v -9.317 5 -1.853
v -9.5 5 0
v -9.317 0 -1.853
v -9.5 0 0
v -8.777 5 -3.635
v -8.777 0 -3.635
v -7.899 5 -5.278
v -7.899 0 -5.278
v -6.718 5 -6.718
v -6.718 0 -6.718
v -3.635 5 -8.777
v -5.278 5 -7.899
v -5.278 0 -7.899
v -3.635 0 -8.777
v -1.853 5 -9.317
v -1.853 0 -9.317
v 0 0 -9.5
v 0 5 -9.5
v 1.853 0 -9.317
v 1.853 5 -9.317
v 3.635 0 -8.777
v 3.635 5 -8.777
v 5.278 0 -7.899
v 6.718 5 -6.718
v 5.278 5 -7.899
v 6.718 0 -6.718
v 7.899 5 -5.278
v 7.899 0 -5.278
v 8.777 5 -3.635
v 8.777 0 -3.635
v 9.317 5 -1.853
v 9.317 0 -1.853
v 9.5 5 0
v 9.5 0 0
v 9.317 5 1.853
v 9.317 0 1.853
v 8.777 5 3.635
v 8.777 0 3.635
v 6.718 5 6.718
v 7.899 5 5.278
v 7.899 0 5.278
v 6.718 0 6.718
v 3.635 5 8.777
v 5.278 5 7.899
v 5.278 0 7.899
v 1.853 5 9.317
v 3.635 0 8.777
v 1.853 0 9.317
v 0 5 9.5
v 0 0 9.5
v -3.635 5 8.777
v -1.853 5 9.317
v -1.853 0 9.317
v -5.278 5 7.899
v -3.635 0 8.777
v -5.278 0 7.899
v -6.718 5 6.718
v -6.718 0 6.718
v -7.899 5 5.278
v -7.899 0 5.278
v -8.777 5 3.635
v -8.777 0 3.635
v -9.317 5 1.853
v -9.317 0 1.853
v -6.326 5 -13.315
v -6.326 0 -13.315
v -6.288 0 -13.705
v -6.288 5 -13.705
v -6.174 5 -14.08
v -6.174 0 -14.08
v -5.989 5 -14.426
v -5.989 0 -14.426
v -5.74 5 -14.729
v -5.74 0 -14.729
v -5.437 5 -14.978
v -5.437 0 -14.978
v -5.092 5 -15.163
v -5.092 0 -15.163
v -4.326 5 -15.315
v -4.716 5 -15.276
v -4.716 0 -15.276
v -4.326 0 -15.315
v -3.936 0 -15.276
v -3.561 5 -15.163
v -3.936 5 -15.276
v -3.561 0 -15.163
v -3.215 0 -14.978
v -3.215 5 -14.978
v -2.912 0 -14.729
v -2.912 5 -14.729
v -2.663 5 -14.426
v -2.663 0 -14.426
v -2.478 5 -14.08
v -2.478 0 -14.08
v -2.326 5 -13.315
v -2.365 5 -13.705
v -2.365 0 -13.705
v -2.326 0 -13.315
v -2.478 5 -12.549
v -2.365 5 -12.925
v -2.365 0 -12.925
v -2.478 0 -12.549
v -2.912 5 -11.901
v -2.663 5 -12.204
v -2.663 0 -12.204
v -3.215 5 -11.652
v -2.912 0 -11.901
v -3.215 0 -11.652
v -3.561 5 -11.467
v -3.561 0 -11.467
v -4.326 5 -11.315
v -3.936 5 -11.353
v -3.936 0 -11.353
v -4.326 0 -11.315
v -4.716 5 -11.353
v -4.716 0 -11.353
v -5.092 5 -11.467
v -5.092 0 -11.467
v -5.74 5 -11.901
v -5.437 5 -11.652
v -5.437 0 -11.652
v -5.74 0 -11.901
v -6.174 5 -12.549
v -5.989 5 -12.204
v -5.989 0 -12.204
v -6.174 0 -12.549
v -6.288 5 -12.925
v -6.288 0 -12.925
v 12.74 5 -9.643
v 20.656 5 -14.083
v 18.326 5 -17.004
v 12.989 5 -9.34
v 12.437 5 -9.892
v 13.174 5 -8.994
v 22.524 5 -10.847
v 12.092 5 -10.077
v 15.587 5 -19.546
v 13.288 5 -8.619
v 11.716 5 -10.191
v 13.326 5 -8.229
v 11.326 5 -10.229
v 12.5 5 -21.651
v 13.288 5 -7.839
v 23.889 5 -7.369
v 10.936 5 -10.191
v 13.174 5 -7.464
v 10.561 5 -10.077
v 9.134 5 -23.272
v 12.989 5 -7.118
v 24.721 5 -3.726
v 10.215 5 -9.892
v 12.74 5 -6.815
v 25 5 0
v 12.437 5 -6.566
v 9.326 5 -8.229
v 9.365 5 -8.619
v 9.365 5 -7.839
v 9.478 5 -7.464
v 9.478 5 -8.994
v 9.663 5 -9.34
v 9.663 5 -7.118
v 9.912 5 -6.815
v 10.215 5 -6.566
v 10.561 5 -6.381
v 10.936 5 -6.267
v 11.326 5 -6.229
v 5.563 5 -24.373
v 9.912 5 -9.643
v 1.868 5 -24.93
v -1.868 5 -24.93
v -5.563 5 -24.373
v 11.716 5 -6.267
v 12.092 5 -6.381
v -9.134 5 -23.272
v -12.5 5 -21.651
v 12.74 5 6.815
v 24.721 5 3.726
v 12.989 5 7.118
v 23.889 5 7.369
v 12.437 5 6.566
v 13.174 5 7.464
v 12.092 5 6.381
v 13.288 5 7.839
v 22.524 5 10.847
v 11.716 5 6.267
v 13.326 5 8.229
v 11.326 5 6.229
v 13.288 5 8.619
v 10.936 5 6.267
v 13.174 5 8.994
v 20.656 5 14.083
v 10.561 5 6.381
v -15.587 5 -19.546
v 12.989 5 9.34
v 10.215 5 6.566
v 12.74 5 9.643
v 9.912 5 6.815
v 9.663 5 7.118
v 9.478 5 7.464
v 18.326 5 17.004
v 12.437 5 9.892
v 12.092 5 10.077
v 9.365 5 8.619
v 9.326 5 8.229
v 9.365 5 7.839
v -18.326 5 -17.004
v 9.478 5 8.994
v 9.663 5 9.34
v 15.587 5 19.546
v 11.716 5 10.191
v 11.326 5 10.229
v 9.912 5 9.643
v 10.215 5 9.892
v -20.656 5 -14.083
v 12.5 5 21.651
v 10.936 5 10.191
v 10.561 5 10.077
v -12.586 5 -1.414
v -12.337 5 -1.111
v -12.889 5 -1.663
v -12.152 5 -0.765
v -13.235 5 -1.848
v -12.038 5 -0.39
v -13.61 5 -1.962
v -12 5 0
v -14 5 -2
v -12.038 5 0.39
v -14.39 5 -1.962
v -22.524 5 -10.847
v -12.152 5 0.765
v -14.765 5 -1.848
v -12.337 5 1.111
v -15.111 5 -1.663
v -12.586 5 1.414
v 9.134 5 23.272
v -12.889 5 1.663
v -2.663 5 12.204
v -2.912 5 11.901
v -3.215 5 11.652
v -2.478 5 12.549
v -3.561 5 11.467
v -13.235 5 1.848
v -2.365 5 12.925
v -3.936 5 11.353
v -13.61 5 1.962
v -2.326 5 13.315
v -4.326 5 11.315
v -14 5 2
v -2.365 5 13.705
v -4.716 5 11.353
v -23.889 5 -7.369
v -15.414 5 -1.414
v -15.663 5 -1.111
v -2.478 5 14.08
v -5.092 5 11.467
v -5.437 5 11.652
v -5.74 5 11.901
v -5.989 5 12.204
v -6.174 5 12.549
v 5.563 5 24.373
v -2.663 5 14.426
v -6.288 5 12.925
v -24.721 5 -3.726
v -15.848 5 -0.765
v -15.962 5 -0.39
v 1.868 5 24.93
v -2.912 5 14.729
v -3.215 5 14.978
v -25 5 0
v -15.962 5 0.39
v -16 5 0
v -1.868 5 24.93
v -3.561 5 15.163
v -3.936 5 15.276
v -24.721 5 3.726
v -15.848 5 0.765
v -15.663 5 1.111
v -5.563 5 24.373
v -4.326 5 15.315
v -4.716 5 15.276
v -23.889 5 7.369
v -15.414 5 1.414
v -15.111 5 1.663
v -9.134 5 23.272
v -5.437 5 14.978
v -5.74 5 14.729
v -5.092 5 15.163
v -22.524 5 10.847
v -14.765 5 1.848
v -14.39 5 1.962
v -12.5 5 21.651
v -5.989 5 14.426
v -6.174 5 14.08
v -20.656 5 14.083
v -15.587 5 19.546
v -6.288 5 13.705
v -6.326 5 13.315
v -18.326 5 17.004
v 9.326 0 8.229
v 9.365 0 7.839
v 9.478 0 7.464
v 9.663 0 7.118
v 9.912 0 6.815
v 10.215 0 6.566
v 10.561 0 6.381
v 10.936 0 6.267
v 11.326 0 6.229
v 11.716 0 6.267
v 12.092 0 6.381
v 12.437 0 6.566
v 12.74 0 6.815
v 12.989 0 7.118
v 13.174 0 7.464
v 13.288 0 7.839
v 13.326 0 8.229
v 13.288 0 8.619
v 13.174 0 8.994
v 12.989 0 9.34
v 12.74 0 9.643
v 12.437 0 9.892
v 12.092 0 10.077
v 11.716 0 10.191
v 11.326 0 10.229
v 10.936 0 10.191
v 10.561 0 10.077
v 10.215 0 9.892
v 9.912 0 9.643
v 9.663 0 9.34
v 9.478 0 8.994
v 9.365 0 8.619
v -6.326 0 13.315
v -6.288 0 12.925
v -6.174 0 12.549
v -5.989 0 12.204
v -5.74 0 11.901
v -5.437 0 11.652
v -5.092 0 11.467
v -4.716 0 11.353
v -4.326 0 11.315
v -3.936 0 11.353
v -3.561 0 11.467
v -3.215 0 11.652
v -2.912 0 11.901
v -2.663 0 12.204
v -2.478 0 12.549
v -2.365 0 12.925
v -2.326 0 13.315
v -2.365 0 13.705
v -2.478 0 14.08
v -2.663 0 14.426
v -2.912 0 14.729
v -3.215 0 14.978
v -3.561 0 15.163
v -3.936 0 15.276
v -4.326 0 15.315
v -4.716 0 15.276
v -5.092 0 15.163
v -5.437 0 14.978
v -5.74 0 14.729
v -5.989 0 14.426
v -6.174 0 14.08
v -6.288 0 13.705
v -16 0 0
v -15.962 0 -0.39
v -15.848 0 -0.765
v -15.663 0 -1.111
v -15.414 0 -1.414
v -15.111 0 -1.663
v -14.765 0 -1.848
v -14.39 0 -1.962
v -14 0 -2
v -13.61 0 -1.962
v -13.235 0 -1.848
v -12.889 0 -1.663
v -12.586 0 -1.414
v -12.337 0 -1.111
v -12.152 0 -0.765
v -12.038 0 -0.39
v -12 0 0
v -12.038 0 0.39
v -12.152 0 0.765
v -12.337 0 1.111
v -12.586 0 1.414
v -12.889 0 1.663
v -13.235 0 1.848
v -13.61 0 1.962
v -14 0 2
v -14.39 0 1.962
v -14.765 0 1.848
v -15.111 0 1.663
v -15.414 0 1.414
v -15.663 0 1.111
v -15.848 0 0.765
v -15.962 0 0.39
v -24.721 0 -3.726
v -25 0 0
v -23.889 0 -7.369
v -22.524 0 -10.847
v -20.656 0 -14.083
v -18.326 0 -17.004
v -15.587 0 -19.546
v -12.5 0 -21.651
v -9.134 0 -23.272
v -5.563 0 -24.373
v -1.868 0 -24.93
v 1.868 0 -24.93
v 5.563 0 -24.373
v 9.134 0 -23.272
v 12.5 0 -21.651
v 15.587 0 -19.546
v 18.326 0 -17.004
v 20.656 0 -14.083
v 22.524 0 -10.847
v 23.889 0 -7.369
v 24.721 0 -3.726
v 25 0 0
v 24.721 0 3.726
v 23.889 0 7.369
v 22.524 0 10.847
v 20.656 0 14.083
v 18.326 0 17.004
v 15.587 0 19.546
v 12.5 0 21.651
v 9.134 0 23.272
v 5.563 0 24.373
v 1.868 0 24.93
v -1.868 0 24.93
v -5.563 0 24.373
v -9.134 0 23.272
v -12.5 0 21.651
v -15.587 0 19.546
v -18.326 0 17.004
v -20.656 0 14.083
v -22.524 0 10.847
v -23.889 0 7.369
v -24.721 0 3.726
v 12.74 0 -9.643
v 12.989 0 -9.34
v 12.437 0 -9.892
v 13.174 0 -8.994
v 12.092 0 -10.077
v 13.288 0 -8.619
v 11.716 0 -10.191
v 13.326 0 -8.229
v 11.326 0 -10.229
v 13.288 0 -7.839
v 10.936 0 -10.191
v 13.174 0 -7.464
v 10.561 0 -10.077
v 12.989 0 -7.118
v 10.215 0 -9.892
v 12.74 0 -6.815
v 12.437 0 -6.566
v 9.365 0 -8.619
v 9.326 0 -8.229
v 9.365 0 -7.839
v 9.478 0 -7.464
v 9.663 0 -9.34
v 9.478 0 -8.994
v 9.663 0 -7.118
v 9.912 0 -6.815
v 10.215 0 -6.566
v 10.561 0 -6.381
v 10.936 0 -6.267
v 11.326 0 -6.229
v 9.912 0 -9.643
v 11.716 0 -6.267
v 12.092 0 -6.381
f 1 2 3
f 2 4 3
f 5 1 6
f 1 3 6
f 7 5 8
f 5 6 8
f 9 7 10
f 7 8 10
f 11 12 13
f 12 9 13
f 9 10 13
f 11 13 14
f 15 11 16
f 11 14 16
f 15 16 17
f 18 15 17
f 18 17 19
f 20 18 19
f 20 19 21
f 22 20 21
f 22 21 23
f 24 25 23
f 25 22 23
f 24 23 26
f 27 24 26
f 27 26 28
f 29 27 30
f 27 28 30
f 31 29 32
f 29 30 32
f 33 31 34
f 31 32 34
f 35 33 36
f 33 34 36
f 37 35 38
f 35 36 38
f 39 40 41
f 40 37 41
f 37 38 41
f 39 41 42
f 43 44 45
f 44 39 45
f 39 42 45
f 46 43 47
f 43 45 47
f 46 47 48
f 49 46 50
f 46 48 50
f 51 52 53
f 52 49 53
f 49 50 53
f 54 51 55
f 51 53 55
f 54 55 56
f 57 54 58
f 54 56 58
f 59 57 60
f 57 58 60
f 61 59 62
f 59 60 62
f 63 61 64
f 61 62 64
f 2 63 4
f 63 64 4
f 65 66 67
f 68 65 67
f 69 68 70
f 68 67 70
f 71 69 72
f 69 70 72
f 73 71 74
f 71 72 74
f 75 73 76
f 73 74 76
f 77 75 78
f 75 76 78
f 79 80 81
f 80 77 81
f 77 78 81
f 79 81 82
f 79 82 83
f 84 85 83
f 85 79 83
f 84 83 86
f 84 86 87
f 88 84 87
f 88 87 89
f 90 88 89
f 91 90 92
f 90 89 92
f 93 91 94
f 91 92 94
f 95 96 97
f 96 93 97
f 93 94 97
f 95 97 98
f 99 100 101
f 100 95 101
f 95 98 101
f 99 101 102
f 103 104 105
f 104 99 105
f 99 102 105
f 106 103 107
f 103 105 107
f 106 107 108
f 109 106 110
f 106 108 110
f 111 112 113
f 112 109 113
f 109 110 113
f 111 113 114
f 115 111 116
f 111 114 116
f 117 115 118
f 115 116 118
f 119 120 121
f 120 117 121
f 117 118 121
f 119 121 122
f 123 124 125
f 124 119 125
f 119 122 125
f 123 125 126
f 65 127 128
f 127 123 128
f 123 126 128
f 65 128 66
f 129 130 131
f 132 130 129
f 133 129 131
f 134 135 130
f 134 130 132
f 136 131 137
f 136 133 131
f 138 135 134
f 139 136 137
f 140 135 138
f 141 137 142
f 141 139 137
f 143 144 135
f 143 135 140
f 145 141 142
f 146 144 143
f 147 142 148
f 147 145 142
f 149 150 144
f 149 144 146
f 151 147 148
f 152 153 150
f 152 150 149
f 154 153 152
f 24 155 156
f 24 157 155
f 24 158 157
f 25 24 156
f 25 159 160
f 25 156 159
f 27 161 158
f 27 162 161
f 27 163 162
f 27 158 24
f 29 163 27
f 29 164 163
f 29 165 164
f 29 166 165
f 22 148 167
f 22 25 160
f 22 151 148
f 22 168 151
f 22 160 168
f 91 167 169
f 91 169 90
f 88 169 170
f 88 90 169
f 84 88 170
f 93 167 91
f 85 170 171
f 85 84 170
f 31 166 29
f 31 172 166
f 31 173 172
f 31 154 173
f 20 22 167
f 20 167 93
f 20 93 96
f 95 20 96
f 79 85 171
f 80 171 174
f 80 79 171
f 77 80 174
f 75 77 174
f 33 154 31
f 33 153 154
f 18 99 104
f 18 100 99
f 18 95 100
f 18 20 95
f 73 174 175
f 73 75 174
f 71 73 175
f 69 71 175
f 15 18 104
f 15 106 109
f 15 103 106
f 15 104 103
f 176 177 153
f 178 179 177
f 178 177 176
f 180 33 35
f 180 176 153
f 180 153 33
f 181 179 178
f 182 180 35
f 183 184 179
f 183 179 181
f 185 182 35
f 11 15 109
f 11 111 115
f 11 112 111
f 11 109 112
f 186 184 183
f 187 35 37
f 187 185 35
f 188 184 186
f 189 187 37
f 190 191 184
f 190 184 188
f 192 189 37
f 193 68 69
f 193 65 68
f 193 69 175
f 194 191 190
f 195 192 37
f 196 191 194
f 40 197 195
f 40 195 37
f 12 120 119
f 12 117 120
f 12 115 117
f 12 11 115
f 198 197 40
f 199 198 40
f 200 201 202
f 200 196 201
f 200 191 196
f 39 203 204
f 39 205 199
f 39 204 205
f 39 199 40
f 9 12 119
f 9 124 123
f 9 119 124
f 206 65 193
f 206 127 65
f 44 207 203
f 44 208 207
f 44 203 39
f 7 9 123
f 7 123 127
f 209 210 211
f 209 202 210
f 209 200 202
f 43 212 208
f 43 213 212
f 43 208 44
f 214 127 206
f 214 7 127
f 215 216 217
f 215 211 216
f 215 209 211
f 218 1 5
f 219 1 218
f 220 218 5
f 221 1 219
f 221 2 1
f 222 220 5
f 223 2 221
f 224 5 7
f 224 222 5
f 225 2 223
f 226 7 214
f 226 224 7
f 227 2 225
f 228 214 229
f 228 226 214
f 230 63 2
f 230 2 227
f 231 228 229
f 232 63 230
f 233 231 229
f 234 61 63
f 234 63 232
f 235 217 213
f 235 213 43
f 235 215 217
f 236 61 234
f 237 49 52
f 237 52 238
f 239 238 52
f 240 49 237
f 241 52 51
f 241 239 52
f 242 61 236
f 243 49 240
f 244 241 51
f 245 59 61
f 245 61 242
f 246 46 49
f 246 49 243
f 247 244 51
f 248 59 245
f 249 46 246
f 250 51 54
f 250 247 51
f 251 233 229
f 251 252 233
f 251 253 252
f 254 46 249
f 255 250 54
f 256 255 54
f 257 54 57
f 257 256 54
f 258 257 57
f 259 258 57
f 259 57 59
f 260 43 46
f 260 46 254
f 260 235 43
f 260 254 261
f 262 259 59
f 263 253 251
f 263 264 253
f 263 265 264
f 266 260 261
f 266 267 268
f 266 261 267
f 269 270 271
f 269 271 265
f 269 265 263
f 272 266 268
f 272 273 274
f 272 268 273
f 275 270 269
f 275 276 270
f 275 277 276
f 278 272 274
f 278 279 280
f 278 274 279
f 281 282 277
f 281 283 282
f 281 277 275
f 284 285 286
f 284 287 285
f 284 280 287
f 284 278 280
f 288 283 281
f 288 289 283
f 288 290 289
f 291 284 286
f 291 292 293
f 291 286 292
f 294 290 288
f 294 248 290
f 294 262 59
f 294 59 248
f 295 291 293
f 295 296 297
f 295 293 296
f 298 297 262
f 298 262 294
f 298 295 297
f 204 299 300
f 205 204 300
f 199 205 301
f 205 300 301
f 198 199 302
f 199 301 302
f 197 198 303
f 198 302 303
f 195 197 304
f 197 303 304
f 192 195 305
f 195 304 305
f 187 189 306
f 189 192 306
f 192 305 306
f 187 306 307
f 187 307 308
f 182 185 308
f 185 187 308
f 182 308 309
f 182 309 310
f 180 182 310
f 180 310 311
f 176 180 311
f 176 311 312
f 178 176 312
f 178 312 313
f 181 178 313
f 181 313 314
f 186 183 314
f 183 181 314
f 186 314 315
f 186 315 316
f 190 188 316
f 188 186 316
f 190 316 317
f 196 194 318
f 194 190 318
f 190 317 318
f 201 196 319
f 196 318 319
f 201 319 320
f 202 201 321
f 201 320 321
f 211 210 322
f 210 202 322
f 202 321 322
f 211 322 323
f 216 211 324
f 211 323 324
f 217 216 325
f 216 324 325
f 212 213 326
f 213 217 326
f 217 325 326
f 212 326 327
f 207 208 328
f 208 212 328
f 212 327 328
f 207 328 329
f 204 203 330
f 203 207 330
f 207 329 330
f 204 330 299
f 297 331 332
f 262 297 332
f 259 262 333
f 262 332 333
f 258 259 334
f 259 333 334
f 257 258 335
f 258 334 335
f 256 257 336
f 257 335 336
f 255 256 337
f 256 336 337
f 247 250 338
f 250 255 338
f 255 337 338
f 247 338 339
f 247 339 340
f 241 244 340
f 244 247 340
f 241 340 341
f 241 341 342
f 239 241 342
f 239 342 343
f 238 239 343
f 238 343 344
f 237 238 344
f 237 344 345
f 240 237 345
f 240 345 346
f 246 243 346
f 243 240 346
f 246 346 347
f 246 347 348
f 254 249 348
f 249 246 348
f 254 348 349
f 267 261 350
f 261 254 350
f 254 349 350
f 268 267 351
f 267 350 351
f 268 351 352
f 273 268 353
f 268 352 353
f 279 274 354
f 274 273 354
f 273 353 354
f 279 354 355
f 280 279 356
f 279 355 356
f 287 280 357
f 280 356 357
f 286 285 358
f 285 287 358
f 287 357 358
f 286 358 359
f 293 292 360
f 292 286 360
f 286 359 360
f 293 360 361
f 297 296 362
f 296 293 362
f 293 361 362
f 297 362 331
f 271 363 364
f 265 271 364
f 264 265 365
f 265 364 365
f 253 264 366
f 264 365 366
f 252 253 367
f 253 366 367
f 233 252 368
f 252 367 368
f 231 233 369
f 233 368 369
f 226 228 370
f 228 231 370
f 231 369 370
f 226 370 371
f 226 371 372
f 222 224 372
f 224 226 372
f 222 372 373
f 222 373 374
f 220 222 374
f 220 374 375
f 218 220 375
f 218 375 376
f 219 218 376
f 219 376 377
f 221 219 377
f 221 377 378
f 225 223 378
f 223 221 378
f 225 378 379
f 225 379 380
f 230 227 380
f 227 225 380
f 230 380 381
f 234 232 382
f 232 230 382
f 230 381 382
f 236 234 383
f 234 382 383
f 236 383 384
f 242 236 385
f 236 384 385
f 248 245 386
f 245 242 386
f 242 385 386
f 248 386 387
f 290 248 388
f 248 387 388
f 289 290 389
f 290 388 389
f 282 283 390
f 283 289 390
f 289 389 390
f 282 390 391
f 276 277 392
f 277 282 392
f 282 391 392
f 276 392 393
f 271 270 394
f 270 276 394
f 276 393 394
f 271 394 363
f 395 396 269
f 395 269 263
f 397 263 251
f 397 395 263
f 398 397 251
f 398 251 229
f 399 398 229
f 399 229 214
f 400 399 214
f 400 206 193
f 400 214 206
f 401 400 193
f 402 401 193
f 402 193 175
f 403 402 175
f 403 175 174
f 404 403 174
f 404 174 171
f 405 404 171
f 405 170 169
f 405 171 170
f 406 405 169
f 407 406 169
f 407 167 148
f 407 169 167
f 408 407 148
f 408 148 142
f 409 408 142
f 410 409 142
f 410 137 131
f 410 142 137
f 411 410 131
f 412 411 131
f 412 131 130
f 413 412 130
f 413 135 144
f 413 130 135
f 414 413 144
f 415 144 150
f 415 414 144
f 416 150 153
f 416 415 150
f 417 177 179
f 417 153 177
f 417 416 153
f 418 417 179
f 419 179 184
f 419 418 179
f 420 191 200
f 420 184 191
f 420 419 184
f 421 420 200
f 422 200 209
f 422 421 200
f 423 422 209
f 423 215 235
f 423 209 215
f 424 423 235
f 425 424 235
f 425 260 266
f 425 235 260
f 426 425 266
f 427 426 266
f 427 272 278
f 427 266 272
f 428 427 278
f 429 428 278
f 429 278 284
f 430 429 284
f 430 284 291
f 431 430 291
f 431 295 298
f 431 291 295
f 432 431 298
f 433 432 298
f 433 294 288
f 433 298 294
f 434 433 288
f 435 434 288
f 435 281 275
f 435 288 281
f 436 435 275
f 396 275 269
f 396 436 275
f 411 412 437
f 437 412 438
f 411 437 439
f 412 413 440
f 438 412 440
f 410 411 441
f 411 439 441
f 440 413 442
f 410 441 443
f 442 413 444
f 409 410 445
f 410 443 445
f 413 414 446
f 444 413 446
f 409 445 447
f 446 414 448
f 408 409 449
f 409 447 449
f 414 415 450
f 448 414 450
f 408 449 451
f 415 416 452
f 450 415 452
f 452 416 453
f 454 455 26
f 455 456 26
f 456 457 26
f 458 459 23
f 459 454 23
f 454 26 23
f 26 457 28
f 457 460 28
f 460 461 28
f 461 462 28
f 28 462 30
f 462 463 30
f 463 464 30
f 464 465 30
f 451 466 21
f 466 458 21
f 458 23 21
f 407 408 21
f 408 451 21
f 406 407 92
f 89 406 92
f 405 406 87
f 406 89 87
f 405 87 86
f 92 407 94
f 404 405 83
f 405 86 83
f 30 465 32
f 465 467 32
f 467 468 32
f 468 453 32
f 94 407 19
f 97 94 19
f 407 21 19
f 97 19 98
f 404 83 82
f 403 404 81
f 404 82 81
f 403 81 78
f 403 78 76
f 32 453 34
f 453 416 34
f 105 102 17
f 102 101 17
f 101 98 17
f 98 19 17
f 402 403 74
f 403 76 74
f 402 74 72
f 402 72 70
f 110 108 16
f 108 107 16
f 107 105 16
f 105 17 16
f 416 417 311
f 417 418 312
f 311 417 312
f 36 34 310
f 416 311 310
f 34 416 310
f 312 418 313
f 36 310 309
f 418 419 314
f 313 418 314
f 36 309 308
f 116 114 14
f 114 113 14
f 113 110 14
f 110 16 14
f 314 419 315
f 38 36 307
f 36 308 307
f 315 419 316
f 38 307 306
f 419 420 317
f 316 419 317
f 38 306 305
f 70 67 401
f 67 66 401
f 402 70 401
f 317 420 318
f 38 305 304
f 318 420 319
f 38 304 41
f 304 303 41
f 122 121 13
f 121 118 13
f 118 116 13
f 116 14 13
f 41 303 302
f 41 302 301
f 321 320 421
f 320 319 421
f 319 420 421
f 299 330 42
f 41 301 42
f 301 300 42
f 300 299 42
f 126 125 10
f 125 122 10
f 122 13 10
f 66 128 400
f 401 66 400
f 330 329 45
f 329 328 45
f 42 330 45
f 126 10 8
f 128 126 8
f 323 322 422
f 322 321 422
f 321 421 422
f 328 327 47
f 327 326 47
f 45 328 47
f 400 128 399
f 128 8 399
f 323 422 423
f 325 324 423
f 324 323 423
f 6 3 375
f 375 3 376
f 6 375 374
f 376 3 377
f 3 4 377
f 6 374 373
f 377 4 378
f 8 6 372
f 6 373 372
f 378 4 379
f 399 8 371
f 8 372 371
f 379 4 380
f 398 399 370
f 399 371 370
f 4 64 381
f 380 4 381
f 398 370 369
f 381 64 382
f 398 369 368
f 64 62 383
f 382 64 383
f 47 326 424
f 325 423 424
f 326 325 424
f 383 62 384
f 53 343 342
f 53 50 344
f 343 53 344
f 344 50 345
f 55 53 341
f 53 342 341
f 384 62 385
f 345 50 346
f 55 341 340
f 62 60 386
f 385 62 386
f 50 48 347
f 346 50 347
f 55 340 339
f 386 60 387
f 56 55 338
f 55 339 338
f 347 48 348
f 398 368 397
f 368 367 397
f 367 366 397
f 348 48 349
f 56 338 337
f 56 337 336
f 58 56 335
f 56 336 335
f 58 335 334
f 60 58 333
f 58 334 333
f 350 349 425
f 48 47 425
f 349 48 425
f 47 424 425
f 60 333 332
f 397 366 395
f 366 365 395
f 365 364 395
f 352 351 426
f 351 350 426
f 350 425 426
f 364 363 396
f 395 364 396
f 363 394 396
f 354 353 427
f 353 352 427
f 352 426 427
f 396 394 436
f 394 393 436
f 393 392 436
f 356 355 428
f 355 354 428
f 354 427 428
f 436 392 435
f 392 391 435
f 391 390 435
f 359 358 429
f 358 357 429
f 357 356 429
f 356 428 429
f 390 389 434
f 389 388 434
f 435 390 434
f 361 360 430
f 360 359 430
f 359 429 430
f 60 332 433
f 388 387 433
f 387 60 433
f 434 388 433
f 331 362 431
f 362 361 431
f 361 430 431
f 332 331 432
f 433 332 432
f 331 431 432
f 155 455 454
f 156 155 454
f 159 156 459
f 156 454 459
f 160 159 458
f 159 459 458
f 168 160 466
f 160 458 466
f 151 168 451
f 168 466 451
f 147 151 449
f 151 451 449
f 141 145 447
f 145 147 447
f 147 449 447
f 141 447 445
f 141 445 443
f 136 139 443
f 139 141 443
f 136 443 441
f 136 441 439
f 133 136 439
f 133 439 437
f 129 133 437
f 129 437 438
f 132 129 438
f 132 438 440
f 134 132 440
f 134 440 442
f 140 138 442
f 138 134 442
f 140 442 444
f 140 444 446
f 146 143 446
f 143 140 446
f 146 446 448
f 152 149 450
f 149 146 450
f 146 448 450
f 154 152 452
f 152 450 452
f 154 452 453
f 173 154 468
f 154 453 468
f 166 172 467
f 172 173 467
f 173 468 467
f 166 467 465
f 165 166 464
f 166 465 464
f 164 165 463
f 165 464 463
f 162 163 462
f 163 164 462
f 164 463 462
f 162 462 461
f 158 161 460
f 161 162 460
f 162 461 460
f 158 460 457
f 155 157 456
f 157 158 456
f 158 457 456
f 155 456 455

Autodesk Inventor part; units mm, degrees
ref_plane "YZ Plane" through (0, 0, 0) normal (1, 0, 0) x (0, 1, 0)
ref_plane "XZ Plane" through (0, 0, 0) normal (0, 1, 0) x (-1, 0, 0)
ref_plane "XY Plane" through (0, 0, 0) normal (0, 0, 1) x (1, 0, 0)
sketch "Эскиз1" plane through (0, 0, 0) normal (0, 1, 0) x (-1, 0, 0)
  circle A0 centre (0, 0) radius 9.5
  circle A1 centre (0, 0) radius 25
  circle A2 centre (14, 0) radius 2
  circle A3 centre (4.3262, 13.3148) radius 2
  circle A4 centre (-11.3262, 8.229) radius 2
  circle A5 centre (-11.3262, -8.229) radius 2
  circle A6 centre (4.3262, -13.3148) radius 2
  dimension "d0" = 19
  dimension "d1" = 50
  dimension "d2" = 4
  dimension "d3" = 14
  dimension "d6" = 360
extrude "Выдавливание1" add sketch "Эскиз1" along normal blind 5
properties part number "ротор мотора"
